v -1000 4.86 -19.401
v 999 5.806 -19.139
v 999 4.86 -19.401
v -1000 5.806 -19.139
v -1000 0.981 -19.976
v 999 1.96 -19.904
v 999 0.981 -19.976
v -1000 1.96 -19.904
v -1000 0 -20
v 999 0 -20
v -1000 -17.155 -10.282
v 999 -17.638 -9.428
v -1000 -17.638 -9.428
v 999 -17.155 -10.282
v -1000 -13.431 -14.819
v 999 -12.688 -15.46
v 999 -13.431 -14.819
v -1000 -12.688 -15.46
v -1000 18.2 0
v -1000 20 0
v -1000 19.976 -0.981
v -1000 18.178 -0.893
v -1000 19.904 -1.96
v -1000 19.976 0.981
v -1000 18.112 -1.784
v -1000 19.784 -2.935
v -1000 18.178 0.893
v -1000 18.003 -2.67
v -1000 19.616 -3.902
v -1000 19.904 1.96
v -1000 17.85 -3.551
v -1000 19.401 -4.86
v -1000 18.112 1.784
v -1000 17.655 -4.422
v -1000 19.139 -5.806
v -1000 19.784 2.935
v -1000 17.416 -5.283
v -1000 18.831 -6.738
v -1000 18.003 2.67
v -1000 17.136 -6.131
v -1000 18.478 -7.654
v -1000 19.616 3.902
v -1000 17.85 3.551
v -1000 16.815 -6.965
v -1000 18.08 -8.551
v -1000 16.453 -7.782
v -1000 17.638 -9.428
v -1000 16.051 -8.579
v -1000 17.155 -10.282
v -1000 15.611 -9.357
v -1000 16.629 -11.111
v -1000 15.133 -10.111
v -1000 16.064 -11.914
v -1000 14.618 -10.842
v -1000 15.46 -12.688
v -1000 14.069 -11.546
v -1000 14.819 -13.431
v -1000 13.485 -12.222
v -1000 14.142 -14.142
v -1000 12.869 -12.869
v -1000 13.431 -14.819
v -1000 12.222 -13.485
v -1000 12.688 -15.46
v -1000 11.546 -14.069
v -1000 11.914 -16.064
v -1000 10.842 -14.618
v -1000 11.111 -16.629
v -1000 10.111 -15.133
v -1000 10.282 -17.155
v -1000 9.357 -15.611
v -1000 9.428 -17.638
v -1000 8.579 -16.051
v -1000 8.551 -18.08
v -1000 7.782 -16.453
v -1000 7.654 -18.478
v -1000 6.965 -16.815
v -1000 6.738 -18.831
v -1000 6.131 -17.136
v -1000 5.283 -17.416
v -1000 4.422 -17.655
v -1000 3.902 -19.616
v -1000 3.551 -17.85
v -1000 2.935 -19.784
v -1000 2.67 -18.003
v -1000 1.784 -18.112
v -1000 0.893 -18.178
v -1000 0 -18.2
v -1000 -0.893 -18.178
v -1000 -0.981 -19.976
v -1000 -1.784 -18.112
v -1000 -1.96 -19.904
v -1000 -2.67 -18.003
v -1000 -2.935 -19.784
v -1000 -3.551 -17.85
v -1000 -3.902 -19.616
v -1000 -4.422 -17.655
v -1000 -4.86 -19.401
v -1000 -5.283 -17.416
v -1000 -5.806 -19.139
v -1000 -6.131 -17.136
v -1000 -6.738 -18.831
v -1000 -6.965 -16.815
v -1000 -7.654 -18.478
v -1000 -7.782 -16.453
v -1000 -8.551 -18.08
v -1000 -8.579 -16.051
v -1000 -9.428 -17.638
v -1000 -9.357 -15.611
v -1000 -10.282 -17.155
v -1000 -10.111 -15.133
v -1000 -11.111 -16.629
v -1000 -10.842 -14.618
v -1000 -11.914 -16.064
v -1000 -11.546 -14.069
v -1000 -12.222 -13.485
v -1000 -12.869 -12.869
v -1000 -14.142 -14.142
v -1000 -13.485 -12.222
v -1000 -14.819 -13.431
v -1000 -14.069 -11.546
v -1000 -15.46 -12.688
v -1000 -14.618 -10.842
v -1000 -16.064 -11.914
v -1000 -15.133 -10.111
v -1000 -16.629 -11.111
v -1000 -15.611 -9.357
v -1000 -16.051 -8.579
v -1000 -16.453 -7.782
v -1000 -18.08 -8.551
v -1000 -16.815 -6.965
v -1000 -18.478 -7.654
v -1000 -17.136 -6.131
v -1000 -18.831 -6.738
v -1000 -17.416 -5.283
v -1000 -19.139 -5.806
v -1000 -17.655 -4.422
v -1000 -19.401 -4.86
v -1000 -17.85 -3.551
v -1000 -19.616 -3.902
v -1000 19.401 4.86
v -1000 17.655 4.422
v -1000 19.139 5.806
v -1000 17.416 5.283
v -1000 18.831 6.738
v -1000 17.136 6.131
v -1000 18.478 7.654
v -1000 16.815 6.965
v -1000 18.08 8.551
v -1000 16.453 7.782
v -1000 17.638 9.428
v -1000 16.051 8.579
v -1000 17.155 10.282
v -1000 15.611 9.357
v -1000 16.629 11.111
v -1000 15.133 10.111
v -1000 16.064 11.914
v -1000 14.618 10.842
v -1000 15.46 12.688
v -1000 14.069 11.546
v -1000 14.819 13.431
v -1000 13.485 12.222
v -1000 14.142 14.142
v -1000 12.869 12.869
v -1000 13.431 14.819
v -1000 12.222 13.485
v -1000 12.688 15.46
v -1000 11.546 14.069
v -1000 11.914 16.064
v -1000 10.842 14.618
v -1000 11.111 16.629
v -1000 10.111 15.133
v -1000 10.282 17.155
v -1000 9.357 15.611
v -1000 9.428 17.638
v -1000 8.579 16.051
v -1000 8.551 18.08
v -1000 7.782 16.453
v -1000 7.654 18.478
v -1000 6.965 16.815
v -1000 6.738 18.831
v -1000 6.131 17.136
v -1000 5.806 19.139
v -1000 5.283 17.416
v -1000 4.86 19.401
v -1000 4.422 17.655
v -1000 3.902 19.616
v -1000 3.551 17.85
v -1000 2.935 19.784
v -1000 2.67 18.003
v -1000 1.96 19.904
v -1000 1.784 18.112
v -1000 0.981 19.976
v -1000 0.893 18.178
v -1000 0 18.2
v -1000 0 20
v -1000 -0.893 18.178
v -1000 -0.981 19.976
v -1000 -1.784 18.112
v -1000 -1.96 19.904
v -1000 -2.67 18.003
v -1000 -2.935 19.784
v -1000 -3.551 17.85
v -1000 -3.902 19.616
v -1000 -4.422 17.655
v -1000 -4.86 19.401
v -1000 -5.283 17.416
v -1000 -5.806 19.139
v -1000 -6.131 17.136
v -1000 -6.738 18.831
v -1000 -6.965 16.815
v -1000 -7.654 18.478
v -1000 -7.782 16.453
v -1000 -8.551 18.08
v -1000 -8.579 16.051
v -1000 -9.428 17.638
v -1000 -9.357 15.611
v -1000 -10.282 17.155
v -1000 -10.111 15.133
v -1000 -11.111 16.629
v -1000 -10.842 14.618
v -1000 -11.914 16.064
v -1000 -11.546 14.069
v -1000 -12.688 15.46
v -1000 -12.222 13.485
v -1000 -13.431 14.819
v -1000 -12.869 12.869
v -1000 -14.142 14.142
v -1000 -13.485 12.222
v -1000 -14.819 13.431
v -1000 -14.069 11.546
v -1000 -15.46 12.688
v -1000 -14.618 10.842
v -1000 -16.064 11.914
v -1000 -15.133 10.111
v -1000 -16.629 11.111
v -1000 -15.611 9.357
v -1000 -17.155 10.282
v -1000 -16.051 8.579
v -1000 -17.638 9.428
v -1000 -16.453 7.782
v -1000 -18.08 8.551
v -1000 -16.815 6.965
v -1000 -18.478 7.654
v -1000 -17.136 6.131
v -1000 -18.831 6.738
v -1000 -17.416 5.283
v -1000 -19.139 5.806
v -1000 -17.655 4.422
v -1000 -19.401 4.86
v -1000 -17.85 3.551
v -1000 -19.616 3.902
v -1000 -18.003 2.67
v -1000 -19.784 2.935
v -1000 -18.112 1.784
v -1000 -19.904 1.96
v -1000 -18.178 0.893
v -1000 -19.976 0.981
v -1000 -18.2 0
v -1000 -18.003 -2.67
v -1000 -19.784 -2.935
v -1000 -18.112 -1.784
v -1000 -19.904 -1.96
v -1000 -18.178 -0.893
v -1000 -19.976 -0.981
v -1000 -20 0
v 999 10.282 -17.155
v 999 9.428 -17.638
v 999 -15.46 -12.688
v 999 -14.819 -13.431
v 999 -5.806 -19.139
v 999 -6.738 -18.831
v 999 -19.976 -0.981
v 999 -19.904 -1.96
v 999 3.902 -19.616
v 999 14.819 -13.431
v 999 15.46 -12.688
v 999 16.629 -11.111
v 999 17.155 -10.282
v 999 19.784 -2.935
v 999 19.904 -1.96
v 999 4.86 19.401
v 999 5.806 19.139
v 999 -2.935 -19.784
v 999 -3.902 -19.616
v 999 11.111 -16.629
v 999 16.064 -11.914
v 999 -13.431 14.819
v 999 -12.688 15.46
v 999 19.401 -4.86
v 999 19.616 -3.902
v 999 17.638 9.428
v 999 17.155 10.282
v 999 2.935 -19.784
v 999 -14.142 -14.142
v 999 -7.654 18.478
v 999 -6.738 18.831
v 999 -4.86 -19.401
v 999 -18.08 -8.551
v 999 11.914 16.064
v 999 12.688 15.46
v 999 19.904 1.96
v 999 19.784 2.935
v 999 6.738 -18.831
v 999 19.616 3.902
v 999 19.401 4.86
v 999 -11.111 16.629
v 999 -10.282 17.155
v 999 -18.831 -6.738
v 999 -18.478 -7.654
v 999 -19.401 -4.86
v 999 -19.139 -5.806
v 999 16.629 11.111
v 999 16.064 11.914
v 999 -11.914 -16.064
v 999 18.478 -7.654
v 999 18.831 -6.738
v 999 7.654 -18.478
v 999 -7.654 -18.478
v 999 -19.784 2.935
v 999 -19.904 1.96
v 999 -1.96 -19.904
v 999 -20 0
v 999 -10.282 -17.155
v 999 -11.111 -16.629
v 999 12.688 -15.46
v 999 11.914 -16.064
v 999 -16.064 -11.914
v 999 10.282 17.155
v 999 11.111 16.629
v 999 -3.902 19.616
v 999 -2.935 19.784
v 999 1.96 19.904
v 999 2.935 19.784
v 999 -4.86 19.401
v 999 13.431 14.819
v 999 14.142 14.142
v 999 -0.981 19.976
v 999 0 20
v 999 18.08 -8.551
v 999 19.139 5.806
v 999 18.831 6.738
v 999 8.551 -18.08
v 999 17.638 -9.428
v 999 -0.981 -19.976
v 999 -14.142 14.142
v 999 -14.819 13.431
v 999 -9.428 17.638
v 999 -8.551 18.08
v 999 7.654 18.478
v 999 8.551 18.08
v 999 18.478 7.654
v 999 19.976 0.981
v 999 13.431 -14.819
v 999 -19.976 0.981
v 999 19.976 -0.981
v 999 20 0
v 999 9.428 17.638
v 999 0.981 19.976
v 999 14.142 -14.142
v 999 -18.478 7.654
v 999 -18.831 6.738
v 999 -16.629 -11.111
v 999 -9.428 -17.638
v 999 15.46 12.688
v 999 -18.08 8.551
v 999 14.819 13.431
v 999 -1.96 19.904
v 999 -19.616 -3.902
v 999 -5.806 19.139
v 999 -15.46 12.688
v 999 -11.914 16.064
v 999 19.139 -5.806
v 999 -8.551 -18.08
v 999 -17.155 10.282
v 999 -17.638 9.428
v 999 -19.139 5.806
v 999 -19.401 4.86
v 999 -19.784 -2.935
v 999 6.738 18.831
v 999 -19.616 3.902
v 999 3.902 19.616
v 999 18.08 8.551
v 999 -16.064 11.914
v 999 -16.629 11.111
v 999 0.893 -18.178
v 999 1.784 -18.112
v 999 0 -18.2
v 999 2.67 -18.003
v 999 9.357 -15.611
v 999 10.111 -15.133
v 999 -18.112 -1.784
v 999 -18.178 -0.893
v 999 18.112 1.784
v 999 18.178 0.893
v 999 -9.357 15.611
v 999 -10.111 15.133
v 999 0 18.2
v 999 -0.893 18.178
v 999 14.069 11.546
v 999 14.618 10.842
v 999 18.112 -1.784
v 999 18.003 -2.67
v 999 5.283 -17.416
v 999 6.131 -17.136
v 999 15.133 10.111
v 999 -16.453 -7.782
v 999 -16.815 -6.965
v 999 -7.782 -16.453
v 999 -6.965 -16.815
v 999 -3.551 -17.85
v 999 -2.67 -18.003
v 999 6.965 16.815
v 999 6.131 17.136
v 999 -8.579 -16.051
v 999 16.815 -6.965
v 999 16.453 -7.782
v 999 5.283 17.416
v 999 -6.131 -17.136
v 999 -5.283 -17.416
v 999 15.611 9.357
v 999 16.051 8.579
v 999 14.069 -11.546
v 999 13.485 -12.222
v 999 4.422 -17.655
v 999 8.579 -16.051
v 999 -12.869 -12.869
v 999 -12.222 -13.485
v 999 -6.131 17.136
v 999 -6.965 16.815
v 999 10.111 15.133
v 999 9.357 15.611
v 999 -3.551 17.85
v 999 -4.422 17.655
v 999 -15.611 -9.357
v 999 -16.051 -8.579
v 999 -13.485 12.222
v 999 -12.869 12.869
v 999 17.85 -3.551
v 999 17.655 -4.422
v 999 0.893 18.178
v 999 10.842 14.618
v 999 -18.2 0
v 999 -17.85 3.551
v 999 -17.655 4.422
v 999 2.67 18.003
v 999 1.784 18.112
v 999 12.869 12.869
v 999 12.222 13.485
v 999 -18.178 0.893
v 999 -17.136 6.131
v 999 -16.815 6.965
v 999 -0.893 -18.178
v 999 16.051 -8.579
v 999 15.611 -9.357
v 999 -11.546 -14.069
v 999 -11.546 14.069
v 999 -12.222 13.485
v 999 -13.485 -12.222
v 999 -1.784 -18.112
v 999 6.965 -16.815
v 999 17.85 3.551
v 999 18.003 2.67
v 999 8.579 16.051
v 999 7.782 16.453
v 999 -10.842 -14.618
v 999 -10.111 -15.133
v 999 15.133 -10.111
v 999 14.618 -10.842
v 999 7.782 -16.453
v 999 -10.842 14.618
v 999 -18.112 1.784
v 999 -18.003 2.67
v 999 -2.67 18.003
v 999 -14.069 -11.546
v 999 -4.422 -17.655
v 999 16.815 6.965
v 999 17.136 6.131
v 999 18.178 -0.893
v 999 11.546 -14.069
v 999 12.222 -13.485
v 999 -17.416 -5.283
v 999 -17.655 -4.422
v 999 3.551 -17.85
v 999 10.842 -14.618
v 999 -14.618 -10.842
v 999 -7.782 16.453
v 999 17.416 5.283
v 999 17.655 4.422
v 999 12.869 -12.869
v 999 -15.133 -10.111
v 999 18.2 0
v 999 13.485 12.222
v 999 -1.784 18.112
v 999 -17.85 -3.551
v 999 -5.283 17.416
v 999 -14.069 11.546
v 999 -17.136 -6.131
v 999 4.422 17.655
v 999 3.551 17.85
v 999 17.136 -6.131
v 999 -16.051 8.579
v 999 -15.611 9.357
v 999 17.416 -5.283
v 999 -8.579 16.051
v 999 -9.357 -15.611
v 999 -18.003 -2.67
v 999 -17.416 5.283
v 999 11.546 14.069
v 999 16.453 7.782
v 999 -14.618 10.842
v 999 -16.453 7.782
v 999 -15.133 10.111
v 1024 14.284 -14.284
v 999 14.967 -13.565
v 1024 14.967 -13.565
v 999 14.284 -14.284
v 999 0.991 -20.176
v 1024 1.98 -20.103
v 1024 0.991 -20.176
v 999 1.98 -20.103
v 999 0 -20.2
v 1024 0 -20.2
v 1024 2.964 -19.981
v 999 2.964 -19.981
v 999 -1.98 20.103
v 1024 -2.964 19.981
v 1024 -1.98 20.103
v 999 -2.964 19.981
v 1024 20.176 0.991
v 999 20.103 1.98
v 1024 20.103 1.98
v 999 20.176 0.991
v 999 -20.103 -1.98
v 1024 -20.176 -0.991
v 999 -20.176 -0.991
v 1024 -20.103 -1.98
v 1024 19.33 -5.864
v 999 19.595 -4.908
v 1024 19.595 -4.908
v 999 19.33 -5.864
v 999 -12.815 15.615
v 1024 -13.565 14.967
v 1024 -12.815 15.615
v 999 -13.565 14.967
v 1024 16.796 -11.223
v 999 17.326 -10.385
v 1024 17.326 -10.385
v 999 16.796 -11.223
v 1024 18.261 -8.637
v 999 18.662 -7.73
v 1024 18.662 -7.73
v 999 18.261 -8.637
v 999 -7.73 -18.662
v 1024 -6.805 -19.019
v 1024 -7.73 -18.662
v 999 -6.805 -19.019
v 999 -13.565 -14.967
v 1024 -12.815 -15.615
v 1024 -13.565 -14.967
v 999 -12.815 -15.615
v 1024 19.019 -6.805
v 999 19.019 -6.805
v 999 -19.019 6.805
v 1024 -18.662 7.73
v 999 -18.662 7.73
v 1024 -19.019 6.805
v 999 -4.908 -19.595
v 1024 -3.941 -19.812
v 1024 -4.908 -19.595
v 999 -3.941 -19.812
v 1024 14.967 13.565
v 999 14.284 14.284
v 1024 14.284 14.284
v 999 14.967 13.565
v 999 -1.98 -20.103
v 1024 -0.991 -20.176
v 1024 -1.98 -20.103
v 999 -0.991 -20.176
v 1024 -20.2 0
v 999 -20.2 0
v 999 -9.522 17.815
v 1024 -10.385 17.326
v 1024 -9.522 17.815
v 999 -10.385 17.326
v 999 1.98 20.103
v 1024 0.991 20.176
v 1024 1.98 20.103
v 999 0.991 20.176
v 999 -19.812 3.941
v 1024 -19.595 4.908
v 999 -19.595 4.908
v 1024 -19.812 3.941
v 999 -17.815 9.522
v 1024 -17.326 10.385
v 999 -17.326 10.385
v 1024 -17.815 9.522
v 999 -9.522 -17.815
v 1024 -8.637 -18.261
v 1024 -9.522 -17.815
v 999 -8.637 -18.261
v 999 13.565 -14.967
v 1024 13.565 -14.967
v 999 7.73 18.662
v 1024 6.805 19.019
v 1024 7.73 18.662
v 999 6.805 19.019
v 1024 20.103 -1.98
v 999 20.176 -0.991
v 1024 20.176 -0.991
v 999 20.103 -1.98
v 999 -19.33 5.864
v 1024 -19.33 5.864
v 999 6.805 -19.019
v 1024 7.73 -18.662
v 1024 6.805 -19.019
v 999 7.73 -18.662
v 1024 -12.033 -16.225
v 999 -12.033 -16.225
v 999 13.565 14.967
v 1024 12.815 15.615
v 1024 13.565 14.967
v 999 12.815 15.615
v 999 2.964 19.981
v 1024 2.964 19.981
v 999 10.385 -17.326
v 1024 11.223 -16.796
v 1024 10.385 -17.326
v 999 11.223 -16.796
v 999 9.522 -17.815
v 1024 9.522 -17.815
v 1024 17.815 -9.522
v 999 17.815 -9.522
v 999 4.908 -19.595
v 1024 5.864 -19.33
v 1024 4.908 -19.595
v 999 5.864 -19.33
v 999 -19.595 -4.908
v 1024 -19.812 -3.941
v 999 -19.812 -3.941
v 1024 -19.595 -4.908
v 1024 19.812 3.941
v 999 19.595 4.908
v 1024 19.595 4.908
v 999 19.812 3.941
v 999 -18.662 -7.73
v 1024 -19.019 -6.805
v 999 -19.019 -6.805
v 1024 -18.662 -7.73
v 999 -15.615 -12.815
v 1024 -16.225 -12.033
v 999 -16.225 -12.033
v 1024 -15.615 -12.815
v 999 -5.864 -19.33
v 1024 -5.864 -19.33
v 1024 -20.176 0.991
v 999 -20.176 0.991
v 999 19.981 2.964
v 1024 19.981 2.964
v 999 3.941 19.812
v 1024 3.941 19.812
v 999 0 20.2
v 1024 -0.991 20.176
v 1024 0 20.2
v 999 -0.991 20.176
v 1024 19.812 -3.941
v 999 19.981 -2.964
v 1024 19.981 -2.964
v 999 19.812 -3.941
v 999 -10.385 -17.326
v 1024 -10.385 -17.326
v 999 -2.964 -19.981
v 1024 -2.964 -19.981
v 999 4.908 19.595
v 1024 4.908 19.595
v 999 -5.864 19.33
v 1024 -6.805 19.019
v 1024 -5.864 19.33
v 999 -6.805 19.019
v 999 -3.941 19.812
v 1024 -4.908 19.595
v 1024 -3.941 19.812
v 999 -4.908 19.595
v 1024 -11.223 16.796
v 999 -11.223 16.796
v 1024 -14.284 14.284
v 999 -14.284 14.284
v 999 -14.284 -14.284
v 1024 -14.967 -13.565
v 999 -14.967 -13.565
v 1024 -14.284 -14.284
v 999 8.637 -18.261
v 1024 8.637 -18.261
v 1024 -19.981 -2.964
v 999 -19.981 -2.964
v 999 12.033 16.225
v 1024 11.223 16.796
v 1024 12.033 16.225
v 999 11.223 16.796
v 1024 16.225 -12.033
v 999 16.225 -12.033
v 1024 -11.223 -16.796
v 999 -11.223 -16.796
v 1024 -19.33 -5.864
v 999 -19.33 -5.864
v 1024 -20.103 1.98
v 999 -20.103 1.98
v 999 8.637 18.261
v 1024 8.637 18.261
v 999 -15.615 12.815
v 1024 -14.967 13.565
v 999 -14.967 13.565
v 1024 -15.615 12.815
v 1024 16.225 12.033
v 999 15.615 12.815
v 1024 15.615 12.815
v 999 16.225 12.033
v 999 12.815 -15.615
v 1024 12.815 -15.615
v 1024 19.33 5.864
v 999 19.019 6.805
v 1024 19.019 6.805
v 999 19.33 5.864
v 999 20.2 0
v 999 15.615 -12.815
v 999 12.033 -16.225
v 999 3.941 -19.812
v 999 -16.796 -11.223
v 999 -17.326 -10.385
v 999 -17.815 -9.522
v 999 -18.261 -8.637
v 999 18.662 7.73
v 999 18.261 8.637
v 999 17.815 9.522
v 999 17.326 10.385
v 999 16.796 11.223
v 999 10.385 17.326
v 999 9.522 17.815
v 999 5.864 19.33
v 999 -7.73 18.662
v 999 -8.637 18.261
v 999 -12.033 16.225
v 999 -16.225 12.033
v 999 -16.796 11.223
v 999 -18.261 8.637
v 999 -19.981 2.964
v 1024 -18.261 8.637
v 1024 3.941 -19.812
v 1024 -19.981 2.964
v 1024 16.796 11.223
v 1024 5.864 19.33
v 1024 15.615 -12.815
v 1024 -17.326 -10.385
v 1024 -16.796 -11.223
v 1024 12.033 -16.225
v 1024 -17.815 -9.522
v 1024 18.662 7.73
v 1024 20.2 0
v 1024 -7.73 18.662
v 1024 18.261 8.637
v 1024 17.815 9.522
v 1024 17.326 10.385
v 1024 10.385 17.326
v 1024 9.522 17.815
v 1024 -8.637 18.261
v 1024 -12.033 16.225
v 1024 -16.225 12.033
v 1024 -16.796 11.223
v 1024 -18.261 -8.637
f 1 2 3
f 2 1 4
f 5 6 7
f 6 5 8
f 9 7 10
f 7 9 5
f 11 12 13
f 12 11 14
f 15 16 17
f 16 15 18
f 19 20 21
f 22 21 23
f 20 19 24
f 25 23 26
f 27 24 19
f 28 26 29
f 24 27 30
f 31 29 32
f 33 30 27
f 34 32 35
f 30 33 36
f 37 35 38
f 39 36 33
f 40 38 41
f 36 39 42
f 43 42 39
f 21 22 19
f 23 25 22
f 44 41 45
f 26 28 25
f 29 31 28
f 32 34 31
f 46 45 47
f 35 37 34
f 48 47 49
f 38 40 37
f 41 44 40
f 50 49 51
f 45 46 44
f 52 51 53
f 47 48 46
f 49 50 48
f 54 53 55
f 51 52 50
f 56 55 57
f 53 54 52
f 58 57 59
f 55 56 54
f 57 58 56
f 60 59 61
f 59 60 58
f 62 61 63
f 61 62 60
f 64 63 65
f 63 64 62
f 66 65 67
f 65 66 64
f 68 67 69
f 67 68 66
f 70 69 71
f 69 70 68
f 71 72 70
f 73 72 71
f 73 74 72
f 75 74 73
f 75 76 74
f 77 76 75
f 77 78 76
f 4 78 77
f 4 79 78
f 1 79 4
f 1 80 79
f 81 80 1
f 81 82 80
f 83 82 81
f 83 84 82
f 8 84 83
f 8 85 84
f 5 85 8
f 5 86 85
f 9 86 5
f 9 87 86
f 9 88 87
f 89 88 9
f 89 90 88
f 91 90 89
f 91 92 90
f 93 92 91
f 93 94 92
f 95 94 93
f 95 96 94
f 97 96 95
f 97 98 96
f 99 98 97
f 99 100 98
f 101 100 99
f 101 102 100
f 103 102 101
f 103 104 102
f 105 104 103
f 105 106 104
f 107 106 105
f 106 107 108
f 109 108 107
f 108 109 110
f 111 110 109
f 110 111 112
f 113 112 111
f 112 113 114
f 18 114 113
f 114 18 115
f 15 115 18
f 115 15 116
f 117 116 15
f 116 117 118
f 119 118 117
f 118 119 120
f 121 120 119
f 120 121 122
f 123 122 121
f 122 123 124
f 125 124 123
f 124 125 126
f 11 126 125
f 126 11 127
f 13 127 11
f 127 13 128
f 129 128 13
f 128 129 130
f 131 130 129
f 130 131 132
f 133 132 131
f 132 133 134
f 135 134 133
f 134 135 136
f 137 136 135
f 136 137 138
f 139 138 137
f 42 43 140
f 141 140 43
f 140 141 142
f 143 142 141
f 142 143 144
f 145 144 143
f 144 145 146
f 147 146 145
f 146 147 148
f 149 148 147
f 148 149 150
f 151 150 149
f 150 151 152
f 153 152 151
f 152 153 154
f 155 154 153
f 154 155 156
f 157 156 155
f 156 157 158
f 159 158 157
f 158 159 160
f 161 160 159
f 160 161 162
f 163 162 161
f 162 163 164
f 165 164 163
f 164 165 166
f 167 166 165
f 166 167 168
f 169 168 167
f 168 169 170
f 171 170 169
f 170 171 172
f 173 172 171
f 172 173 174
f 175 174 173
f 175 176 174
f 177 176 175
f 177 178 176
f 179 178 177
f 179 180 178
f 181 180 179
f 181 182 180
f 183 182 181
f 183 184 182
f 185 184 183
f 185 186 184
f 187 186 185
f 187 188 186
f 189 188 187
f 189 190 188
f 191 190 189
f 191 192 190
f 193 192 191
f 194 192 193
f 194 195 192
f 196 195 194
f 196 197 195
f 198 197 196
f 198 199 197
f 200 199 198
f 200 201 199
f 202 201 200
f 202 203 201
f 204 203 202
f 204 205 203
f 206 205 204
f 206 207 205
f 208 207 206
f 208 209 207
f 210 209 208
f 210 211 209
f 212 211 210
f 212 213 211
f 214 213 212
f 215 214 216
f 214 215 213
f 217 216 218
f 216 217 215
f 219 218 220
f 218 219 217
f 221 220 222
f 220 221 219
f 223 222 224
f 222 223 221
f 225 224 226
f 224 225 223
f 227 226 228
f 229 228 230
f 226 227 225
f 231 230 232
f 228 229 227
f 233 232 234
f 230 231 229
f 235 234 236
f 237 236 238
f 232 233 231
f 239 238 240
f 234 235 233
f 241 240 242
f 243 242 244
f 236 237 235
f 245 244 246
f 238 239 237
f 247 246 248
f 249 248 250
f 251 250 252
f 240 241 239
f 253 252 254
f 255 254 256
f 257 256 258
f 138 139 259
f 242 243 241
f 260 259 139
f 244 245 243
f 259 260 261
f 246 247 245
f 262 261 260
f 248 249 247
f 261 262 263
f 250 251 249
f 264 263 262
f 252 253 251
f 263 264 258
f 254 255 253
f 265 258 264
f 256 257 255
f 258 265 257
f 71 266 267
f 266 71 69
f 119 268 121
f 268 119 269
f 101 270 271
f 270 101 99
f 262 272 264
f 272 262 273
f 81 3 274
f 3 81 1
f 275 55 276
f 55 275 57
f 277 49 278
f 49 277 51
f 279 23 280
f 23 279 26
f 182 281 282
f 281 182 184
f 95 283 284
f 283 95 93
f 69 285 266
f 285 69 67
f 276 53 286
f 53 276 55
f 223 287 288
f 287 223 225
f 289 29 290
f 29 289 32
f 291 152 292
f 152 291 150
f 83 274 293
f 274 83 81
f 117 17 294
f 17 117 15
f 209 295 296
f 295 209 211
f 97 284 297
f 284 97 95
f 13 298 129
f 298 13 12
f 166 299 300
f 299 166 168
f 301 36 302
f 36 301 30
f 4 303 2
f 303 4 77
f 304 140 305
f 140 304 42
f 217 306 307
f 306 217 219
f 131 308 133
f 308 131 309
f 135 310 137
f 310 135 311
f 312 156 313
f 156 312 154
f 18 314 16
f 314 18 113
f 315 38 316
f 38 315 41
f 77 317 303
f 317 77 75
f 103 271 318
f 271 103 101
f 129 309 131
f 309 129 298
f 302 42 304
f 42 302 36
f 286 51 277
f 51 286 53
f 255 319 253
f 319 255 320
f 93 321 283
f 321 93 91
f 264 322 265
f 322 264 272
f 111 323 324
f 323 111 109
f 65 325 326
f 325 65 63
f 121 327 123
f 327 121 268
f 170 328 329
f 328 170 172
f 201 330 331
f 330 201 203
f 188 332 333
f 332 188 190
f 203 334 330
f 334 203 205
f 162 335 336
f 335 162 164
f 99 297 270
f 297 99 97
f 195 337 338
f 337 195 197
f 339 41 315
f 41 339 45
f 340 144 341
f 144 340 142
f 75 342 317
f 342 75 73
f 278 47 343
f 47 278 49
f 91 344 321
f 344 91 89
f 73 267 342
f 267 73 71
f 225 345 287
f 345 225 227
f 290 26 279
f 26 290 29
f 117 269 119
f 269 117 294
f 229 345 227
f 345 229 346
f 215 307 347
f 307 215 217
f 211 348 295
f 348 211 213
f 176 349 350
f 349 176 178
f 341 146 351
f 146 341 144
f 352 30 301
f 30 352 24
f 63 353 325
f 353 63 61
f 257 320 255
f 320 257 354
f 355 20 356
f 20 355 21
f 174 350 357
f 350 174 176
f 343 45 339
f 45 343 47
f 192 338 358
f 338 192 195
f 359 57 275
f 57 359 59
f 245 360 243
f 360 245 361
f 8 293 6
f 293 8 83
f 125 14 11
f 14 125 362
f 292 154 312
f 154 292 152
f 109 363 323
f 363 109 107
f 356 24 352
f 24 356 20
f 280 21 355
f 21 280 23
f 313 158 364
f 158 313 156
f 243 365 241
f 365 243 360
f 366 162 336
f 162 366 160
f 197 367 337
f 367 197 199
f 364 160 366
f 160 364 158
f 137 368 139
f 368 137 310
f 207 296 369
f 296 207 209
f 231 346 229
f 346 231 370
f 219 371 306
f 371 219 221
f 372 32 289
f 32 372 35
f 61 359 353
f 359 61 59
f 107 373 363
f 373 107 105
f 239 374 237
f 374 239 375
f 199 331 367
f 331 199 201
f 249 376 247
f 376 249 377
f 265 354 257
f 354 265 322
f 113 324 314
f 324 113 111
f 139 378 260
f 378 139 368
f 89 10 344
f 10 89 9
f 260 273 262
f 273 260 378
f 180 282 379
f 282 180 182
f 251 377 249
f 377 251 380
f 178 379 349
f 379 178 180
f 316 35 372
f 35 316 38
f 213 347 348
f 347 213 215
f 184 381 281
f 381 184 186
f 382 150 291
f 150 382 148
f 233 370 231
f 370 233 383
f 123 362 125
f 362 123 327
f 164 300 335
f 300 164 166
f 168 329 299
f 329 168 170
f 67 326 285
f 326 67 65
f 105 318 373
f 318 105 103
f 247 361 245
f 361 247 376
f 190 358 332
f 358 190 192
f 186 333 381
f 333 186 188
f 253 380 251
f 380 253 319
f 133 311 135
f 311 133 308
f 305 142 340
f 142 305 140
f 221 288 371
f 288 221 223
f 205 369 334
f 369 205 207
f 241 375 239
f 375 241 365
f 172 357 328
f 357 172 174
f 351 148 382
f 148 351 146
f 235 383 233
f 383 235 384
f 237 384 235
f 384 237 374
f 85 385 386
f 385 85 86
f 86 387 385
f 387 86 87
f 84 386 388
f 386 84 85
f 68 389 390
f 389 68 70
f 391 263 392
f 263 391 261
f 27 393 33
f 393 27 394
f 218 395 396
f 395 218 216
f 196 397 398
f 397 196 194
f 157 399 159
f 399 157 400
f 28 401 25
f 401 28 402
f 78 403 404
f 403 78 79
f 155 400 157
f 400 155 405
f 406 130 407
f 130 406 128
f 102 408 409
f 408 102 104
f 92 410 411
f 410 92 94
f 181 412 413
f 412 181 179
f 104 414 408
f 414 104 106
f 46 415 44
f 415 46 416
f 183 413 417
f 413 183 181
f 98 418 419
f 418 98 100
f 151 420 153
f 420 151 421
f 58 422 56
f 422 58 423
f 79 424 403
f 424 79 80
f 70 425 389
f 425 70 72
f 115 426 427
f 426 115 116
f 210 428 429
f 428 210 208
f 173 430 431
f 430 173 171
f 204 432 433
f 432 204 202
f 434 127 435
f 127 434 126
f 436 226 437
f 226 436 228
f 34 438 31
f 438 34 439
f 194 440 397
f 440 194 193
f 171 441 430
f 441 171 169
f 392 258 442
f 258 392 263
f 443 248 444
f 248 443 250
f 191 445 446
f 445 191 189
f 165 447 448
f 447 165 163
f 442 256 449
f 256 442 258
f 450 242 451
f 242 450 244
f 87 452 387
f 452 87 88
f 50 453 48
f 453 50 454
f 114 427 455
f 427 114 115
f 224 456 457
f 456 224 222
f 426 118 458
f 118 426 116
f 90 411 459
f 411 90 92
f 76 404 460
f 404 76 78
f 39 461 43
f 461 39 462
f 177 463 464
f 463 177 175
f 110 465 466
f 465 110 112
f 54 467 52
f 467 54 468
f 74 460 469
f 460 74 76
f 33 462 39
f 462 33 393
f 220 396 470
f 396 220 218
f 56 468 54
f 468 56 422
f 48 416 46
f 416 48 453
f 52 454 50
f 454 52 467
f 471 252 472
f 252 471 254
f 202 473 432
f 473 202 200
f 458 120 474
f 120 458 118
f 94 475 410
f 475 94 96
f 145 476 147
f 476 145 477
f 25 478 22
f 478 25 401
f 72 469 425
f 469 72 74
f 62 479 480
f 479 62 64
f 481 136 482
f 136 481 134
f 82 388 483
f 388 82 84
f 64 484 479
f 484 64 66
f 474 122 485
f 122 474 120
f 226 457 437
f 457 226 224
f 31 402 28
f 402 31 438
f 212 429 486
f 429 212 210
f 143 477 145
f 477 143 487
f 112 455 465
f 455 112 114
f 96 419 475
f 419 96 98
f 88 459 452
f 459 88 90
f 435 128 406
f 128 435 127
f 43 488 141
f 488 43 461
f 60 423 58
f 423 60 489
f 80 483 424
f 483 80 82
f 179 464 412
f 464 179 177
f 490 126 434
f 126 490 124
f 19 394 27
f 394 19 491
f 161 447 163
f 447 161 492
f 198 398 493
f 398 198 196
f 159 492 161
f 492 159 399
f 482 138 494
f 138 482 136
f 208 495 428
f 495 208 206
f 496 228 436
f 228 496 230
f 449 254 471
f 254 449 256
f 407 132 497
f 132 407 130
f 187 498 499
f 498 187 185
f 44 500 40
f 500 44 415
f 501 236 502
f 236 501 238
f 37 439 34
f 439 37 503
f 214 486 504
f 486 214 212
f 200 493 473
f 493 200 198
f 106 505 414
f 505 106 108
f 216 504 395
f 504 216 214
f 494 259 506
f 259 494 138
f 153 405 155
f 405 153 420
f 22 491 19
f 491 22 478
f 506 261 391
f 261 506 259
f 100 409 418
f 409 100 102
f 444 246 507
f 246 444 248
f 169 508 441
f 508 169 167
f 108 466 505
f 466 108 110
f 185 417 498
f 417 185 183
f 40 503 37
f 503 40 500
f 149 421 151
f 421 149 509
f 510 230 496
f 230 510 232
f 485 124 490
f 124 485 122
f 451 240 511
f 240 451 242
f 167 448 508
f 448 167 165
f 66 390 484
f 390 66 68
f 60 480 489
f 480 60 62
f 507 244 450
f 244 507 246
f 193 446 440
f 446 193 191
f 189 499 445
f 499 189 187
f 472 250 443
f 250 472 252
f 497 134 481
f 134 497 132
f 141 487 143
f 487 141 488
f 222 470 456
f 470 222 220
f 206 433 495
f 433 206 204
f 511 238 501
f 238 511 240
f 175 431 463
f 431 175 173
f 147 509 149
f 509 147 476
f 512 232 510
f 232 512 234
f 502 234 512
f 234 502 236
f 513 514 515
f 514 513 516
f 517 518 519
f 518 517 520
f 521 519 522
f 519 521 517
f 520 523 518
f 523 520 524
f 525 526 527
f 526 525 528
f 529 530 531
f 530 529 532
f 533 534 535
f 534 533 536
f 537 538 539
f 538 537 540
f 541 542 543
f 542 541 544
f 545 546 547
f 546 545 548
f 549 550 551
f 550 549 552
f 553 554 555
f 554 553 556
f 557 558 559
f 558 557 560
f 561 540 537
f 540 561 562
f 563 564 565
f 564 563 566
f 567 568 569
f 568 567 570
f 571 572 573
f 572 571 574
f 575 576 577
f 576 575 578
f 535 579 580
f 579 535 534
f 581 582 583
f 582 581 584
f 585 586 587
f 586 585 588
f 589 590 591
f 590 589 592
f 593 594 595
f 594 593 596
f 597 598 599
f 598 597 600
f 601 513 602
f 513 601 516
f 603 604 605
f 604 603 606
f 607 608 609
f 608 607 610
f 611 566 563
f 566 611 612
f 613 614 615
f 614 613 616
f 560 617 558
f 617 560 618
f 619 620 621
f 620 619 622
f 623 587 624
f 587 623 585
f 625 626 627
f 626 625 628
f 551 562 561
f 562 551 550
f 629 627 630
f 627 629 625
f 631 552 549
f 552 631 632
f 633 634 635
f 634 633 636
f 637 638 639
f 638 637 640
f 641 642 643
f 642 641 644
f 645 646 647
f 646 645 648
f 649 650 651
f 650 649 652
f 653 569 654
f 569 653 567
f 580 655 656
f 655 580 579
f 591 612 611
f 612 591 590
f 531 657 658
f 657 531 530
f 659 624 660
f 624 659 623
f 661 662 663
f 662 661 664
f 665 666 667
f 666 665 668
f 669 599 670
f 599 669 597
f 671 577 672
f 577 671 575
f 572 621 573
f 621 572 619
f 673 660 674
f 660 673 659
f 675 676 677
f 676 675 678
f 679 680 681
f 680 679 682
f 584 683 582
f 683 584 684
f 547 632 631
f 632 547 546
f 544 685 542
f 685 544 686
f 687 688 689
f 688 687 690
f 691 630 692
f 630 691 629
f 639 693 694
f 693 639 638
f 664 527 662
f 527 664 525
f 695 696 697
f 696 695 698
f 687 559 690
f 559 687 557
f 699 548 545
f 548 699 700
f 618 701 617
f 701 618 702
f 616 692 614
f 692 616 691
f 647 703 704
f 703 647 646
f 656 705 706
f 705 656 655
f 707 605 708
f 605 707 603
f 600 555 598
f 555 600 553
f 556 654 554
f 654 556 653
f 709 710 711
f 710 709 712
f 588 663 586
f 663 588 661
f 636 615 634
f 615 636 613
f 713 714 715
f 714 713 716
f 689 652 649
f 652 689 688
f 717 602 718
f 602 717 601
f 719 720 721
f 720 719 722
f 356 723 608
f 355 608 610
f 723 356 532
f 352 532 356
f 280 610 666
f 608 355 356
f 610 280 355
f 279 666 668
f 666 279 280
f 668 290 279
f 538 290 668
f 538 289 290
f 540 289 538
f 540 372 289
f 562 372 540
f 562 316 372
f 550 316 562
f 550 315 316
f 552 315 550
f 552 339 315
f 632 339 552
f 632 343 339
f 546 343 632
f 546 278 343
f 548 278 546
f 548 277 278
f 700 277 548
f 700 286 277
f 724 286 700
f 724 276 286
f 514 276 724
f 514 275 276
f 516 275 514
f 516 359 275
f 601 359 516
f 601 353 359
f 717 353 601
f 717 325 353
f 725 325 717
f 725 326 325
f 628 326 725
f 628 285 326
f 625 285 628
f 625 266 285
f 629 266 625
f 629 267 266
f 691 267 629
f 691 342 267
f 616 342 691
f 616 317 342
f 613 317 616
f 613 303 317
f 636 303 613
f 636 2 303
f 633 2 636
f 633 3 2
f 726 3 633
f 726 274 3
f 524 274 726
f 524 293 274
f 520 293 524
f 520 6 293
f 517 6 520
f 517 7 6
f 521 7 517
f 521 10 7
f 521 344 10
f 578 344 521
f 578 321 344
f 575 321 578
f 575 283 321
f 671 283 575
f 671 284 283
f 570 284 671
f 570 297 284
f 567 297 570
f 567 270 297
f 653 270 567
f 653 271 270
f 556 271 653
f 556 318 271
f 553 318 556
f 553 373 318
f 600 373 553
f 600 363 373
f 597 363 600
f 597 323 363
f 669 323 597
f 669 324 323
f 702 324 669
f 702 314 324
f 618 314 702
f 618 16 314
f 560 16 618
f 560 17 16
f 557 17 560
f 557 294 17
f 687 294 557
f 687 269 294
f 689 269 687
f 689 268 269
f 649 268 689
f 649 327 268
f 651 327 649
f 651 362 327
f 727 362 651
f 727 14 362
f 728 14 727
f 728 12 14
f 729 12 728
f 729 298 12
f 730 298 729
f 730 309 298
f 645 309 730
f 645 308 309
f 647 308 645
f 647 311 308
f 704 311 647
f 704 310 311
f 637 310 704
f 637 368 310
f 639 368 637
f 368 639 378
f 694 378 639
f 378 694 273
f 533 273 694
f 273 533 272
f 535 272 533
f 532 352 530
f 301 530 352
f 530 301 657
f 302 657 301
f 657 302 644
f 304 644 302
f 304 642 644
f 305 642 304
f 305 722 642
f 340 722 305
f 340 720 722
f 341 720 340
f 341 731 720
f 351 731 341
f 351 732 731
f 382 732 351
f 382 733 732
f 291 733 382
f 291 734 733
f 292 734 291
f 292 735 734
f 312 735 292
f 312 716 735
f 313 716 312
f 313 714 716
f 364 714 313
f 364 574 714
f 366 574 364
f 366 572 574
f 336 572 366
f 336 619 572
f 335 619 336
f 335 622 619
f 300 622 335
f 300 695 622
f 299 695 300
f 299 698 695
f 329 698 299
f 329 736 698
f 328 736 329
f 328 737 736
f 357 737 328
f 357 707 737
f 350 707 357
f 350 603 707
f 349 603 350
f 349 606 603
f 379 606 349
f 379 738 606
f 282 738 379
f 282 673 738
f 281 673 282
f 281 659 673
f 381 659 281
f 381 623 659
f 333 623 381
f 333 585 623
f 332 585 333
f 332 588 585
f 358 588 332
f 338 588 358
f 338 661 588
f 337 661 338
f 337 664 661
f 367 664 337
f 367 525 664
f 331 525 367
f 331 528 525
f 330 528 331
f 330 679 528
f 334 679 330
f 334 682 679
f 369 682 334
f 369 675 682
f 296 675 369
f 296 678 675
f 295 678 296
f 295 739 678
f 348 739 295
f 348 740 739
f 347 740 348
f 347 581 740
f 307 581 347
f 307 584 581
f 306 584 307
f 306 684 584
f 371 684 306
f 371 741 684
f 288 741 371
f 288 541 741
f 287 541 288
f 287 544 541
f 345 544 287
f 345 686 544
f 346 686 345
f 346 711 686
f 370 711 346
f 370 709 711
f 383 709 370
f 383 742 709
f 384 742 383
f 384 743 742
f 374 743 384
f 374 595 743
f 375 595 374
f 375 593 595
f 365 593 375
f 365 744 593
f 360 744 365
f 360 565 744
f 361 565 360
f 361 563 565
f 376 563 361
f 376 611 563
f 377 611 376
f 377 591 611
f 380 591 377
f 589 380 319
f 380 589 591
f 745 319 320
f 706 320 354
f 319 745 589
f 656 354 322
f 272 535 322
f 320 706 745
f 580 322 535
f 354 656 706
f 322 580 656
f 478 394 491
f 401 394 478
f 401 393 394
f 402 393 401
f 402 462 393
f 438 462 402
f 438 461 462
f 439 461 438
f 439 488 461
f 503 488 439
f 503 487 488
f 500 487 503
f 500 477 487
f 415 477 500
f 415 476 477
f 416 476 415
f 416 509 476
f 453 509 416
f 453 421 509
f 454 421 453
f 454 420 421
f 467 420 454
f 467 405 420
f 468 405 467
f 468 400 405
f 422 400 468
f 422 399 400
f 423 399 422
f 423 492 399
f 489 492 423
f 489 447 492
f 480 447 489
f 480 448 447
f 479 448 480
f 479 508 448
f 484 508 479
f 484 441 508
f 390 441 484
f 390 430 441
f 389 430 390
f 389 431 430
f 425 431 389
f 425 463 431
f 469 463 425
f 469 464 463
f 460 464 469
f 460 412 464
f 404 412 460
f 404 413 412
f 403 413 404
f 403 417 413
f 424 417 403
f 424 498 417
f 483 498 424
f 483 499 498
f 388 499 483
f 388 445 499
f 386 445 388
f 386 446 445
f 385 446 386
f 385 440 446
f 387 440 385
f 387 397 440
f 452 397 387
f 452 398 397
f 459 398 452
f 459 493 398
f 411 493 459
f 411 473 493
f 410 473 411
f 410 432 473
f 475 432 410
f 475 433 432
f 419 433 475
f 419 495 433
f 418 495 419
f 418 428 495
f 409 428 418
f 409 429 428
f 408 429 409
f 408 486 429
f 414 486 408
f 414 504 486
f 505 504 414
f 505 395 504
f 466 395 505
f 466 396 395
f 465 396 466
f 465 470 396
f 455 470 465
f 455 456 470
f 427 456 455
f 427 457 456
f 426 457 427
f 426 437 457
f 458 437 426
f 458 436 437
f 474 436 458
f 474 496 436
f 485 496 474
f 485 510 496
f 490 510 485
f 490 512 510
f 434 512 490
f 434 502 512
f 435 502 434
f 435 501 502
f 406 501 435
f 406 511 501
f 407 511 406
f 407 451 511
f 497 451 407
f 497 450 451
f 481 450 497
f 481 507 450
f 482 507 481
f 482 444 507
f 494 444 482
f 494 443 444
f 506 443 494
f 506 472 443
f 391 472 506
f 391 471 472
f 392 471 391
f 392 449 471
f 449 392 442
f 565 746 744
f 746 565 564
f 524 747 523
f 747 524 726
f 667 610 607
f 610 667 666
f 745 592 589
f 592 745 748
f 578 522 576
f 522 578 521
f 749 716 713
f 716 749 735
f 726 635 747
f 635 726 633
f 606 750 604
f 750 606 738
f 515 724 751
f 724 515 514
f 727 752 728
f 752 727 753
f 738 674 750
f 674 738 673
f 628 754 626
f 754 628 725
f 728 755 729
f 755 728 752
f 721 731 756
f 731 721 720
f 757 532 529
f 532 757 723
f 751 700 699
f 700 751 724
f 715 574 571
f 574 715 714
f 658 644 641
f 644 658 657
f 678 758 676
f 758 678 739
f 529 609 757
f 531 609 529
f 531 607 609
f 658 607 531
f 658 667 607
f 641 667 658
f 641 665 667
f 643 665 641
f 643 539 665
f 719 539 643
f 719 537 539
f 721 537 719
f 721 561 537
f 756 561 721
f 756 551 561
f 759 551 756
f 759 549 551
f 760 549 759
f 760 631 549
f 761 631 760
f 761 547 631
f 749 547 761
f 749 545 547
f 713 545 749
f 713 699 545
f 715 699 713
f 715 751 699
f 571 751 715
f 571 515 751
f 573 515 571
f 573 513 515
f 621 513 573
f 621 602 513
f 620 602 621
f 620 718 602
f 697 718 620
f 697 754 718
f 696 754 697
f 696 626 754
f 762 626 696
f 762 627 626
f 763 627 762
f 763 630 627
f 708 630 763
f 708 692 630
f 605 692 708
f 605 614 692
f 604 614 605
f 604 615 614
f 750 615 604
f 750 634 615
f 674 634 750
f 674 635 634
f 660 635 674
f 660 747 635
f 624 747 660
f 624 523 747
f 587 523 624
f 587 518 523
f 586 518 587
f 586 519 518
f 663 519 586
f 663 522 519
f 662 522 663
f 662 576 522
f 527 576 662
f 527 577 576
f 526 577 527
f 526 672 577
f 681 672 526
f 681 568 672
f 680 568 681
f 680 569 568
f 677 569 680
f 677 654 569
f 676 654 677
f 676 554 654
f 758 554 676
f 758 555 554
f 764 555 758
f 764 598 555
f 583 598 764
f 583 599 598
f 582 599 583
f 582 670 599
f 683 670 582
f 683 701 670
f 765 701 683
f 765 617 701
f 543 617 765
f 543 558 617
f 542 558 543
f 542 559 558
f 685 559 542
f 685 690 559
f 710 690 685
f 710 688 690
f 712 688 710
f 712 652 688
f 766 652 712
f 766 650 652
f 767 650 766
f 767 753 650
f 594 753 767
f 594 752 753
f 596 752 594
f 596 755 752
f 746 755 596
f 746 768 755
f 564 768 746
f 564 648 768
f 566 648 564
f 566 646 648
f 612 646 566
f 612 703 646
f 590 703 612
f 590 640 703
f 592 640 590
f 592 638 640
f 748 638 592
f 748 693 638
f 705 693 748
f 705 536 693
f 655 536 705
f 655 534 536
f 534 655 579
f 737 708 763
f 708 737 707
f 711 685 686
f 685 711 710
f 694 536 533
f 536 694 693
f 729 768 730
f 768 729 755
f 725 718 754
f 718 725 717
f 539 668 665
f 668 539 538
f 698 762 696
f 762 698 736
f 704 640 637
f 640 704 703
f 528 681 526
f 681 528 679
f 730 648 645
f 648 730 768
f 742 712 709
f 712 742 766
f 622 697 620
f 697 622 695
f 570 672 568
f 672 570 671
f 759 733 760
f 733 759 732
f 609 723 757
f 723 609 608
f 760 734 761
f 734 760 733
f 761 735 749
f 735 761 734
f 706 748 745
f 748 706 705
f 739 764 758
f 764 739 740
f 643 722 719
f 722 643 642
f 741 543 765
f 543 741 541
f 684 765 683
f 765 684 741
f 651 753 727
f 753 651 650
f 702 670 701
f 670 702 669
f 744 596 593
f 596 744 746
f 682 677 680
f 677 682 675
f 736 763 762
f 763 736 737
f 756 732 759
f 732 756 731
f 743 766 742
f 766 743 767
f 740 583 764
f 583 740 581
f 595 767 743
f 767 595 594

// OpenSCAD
// HT 40 pipe 2000 mm (axis along X so front/back/left/right views show the length)

// Parameters
nominal_size = 40; //[20:80:1]
length_mm = 2000; //[1000:4000:10]
ht40_outer_diameter = 40; //[30:60:1]
ht40_wall_thickness = 1.8; //[1:4:0.1]
include_end_fitting = 1; //[0:1:1]
end_fitting_length = 25; //[10:60:1]
end_fitting_radial_clearance = 0.2; //[0:1:0.05]
connect_overlap = 1; //[0.5:2:0.1]

$fn = 128;

// HT Pipe - complete geometry
module ht_pipe() {
  od = ht40_outer_diameter;
  wt = ht40_wall_thickness;
  id = max(0.01, od - 2*wt);

  // Keep inner cut slightly longer to guarantee a clean through-hole
  eps = 0.2;

  // Build along Z then rotate so length is along X (better orthographic visibility)
  rotate([0, 90, 0]) {
    color([0.85, 0.85, 0.8]) {
      union() {
        // Main pipe (hollow)
        difference() {
          cylinder(d=od, h=length_mm, center=true);
          cylinder(d=id, h=length_mm + 2*eps, center=true);
        }

        // End fitting stub (solid sleeve) connected with computed translate + overlap
        if (include_end_fitting) {
          translate([0, 0, length_mm/2 + end_fitting_length/2 - connect_overlap])
            cylinder(d=od + 2*end_fitting_radial_clearance, h=end_fitting_length, center=true);
        }
      }
    }
  }
}

// Assembly
module assembly() {
  ht_pipe();
}

assembly();
